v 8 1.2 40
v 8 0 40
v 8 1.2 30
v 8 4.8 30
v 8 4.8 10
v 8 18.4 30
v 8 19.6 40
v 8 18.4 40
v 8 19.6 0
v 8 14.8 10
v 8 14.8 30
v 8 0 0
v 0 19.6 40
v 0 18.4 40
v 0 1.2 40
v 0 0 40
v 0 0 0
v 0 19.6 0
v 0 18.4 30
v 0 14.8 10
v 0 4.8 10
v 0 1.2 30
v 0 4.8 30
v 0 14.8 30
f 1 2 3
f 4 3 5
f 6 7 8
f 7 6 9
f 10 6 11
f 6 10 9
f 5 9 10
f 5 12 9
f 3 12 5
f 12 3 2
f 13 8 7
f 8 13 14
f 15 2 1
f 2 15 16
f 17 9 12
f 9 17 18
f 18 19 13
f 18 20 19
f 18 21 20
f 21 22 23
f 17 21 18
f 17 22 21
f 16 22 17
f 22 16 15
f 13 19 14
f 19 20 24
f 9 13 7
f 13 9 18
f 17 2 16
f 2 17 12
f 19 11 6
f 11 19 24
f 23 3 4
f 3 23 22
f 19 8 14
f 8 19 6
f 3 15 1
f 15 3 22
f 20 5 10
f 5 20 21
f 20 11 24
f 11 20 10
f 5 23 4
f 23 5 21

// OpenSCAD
// Konzola s excentricky ulozenym otvorom - jej otocenim je mozne vyrovnat policku do vodovahy.
//   hrubka - hrubka okolo konzoly
//   steps - odkrokovanie pre roznu hrubku konzoly (pre vyrovnanie policky do vodovahy - otocenim konzoly mozem posunut stranu policky vyssie/nizsie)
module konzola(priemer = 10, dlzka = 90, hrubka = 6, steps = 1, ponor = 10) {
    a = priemer + hrubka + hrubka + 2 * steps;
    b = priemer + hrubka + hrubka + 4 * steps;

    posx = hrubka + priemer / 2;
    posy = hrubka + steps + priemer / 2;

    difference() {
        cube([a, b, dlzka]);
        translate([posx, posy, 0]) cylinder(h = dlzka + 10, d = 10);
        translate([posx, posy, 0]) cylinder(h = 8, d = 19.5);
        translate([2, 2, dlzka - ponor]) cube([a - 4, b - 4, ponor + 5]);
    }
}

// korekcia - o kolko zmensit rozmer vnutorneho boxu aby sa dalo zasunut do otvoru
module krytka(priemer = 10, hrubka = 6, steps = 1, korekcia = 0.2) {
    a = priemer + hrubka + hrubka + 2 * steps;
    b = priemer + hrubka + hrubka + 4 * steps;
    union() {
        cube([a, b, 2]);
        difference() {
            translate([2 + korekcia/2, 2 + korekcia/2, 2])
                cube([a - 4 - korekcia, b - 4 - korekcia, 4]);
            translate([3, 3, 2]) cube([a - 6, b - 6, 4]);
        }
    }
}

module kluc_na_skrutku(p = 17.2) {
    stena = 1.2;
    difference() {
        cube([8, p+2*stena, 40]);
        translate([-1,stena,30]) cube([12, p, 30]);
        translate([-1,stena+(p-10)/2,10]) cube([12, 10, 50]);
    }
}

// Konzoly trčia 6.2 , 6.8, 6.8, 7.8 cm
//konzola(steps = 0.5, hrubka = 7, ponor = 90-68);
//krytka(steps = 0.5, hrubka = 7, korekcia=0.2);

kluc_na_skrutku();
